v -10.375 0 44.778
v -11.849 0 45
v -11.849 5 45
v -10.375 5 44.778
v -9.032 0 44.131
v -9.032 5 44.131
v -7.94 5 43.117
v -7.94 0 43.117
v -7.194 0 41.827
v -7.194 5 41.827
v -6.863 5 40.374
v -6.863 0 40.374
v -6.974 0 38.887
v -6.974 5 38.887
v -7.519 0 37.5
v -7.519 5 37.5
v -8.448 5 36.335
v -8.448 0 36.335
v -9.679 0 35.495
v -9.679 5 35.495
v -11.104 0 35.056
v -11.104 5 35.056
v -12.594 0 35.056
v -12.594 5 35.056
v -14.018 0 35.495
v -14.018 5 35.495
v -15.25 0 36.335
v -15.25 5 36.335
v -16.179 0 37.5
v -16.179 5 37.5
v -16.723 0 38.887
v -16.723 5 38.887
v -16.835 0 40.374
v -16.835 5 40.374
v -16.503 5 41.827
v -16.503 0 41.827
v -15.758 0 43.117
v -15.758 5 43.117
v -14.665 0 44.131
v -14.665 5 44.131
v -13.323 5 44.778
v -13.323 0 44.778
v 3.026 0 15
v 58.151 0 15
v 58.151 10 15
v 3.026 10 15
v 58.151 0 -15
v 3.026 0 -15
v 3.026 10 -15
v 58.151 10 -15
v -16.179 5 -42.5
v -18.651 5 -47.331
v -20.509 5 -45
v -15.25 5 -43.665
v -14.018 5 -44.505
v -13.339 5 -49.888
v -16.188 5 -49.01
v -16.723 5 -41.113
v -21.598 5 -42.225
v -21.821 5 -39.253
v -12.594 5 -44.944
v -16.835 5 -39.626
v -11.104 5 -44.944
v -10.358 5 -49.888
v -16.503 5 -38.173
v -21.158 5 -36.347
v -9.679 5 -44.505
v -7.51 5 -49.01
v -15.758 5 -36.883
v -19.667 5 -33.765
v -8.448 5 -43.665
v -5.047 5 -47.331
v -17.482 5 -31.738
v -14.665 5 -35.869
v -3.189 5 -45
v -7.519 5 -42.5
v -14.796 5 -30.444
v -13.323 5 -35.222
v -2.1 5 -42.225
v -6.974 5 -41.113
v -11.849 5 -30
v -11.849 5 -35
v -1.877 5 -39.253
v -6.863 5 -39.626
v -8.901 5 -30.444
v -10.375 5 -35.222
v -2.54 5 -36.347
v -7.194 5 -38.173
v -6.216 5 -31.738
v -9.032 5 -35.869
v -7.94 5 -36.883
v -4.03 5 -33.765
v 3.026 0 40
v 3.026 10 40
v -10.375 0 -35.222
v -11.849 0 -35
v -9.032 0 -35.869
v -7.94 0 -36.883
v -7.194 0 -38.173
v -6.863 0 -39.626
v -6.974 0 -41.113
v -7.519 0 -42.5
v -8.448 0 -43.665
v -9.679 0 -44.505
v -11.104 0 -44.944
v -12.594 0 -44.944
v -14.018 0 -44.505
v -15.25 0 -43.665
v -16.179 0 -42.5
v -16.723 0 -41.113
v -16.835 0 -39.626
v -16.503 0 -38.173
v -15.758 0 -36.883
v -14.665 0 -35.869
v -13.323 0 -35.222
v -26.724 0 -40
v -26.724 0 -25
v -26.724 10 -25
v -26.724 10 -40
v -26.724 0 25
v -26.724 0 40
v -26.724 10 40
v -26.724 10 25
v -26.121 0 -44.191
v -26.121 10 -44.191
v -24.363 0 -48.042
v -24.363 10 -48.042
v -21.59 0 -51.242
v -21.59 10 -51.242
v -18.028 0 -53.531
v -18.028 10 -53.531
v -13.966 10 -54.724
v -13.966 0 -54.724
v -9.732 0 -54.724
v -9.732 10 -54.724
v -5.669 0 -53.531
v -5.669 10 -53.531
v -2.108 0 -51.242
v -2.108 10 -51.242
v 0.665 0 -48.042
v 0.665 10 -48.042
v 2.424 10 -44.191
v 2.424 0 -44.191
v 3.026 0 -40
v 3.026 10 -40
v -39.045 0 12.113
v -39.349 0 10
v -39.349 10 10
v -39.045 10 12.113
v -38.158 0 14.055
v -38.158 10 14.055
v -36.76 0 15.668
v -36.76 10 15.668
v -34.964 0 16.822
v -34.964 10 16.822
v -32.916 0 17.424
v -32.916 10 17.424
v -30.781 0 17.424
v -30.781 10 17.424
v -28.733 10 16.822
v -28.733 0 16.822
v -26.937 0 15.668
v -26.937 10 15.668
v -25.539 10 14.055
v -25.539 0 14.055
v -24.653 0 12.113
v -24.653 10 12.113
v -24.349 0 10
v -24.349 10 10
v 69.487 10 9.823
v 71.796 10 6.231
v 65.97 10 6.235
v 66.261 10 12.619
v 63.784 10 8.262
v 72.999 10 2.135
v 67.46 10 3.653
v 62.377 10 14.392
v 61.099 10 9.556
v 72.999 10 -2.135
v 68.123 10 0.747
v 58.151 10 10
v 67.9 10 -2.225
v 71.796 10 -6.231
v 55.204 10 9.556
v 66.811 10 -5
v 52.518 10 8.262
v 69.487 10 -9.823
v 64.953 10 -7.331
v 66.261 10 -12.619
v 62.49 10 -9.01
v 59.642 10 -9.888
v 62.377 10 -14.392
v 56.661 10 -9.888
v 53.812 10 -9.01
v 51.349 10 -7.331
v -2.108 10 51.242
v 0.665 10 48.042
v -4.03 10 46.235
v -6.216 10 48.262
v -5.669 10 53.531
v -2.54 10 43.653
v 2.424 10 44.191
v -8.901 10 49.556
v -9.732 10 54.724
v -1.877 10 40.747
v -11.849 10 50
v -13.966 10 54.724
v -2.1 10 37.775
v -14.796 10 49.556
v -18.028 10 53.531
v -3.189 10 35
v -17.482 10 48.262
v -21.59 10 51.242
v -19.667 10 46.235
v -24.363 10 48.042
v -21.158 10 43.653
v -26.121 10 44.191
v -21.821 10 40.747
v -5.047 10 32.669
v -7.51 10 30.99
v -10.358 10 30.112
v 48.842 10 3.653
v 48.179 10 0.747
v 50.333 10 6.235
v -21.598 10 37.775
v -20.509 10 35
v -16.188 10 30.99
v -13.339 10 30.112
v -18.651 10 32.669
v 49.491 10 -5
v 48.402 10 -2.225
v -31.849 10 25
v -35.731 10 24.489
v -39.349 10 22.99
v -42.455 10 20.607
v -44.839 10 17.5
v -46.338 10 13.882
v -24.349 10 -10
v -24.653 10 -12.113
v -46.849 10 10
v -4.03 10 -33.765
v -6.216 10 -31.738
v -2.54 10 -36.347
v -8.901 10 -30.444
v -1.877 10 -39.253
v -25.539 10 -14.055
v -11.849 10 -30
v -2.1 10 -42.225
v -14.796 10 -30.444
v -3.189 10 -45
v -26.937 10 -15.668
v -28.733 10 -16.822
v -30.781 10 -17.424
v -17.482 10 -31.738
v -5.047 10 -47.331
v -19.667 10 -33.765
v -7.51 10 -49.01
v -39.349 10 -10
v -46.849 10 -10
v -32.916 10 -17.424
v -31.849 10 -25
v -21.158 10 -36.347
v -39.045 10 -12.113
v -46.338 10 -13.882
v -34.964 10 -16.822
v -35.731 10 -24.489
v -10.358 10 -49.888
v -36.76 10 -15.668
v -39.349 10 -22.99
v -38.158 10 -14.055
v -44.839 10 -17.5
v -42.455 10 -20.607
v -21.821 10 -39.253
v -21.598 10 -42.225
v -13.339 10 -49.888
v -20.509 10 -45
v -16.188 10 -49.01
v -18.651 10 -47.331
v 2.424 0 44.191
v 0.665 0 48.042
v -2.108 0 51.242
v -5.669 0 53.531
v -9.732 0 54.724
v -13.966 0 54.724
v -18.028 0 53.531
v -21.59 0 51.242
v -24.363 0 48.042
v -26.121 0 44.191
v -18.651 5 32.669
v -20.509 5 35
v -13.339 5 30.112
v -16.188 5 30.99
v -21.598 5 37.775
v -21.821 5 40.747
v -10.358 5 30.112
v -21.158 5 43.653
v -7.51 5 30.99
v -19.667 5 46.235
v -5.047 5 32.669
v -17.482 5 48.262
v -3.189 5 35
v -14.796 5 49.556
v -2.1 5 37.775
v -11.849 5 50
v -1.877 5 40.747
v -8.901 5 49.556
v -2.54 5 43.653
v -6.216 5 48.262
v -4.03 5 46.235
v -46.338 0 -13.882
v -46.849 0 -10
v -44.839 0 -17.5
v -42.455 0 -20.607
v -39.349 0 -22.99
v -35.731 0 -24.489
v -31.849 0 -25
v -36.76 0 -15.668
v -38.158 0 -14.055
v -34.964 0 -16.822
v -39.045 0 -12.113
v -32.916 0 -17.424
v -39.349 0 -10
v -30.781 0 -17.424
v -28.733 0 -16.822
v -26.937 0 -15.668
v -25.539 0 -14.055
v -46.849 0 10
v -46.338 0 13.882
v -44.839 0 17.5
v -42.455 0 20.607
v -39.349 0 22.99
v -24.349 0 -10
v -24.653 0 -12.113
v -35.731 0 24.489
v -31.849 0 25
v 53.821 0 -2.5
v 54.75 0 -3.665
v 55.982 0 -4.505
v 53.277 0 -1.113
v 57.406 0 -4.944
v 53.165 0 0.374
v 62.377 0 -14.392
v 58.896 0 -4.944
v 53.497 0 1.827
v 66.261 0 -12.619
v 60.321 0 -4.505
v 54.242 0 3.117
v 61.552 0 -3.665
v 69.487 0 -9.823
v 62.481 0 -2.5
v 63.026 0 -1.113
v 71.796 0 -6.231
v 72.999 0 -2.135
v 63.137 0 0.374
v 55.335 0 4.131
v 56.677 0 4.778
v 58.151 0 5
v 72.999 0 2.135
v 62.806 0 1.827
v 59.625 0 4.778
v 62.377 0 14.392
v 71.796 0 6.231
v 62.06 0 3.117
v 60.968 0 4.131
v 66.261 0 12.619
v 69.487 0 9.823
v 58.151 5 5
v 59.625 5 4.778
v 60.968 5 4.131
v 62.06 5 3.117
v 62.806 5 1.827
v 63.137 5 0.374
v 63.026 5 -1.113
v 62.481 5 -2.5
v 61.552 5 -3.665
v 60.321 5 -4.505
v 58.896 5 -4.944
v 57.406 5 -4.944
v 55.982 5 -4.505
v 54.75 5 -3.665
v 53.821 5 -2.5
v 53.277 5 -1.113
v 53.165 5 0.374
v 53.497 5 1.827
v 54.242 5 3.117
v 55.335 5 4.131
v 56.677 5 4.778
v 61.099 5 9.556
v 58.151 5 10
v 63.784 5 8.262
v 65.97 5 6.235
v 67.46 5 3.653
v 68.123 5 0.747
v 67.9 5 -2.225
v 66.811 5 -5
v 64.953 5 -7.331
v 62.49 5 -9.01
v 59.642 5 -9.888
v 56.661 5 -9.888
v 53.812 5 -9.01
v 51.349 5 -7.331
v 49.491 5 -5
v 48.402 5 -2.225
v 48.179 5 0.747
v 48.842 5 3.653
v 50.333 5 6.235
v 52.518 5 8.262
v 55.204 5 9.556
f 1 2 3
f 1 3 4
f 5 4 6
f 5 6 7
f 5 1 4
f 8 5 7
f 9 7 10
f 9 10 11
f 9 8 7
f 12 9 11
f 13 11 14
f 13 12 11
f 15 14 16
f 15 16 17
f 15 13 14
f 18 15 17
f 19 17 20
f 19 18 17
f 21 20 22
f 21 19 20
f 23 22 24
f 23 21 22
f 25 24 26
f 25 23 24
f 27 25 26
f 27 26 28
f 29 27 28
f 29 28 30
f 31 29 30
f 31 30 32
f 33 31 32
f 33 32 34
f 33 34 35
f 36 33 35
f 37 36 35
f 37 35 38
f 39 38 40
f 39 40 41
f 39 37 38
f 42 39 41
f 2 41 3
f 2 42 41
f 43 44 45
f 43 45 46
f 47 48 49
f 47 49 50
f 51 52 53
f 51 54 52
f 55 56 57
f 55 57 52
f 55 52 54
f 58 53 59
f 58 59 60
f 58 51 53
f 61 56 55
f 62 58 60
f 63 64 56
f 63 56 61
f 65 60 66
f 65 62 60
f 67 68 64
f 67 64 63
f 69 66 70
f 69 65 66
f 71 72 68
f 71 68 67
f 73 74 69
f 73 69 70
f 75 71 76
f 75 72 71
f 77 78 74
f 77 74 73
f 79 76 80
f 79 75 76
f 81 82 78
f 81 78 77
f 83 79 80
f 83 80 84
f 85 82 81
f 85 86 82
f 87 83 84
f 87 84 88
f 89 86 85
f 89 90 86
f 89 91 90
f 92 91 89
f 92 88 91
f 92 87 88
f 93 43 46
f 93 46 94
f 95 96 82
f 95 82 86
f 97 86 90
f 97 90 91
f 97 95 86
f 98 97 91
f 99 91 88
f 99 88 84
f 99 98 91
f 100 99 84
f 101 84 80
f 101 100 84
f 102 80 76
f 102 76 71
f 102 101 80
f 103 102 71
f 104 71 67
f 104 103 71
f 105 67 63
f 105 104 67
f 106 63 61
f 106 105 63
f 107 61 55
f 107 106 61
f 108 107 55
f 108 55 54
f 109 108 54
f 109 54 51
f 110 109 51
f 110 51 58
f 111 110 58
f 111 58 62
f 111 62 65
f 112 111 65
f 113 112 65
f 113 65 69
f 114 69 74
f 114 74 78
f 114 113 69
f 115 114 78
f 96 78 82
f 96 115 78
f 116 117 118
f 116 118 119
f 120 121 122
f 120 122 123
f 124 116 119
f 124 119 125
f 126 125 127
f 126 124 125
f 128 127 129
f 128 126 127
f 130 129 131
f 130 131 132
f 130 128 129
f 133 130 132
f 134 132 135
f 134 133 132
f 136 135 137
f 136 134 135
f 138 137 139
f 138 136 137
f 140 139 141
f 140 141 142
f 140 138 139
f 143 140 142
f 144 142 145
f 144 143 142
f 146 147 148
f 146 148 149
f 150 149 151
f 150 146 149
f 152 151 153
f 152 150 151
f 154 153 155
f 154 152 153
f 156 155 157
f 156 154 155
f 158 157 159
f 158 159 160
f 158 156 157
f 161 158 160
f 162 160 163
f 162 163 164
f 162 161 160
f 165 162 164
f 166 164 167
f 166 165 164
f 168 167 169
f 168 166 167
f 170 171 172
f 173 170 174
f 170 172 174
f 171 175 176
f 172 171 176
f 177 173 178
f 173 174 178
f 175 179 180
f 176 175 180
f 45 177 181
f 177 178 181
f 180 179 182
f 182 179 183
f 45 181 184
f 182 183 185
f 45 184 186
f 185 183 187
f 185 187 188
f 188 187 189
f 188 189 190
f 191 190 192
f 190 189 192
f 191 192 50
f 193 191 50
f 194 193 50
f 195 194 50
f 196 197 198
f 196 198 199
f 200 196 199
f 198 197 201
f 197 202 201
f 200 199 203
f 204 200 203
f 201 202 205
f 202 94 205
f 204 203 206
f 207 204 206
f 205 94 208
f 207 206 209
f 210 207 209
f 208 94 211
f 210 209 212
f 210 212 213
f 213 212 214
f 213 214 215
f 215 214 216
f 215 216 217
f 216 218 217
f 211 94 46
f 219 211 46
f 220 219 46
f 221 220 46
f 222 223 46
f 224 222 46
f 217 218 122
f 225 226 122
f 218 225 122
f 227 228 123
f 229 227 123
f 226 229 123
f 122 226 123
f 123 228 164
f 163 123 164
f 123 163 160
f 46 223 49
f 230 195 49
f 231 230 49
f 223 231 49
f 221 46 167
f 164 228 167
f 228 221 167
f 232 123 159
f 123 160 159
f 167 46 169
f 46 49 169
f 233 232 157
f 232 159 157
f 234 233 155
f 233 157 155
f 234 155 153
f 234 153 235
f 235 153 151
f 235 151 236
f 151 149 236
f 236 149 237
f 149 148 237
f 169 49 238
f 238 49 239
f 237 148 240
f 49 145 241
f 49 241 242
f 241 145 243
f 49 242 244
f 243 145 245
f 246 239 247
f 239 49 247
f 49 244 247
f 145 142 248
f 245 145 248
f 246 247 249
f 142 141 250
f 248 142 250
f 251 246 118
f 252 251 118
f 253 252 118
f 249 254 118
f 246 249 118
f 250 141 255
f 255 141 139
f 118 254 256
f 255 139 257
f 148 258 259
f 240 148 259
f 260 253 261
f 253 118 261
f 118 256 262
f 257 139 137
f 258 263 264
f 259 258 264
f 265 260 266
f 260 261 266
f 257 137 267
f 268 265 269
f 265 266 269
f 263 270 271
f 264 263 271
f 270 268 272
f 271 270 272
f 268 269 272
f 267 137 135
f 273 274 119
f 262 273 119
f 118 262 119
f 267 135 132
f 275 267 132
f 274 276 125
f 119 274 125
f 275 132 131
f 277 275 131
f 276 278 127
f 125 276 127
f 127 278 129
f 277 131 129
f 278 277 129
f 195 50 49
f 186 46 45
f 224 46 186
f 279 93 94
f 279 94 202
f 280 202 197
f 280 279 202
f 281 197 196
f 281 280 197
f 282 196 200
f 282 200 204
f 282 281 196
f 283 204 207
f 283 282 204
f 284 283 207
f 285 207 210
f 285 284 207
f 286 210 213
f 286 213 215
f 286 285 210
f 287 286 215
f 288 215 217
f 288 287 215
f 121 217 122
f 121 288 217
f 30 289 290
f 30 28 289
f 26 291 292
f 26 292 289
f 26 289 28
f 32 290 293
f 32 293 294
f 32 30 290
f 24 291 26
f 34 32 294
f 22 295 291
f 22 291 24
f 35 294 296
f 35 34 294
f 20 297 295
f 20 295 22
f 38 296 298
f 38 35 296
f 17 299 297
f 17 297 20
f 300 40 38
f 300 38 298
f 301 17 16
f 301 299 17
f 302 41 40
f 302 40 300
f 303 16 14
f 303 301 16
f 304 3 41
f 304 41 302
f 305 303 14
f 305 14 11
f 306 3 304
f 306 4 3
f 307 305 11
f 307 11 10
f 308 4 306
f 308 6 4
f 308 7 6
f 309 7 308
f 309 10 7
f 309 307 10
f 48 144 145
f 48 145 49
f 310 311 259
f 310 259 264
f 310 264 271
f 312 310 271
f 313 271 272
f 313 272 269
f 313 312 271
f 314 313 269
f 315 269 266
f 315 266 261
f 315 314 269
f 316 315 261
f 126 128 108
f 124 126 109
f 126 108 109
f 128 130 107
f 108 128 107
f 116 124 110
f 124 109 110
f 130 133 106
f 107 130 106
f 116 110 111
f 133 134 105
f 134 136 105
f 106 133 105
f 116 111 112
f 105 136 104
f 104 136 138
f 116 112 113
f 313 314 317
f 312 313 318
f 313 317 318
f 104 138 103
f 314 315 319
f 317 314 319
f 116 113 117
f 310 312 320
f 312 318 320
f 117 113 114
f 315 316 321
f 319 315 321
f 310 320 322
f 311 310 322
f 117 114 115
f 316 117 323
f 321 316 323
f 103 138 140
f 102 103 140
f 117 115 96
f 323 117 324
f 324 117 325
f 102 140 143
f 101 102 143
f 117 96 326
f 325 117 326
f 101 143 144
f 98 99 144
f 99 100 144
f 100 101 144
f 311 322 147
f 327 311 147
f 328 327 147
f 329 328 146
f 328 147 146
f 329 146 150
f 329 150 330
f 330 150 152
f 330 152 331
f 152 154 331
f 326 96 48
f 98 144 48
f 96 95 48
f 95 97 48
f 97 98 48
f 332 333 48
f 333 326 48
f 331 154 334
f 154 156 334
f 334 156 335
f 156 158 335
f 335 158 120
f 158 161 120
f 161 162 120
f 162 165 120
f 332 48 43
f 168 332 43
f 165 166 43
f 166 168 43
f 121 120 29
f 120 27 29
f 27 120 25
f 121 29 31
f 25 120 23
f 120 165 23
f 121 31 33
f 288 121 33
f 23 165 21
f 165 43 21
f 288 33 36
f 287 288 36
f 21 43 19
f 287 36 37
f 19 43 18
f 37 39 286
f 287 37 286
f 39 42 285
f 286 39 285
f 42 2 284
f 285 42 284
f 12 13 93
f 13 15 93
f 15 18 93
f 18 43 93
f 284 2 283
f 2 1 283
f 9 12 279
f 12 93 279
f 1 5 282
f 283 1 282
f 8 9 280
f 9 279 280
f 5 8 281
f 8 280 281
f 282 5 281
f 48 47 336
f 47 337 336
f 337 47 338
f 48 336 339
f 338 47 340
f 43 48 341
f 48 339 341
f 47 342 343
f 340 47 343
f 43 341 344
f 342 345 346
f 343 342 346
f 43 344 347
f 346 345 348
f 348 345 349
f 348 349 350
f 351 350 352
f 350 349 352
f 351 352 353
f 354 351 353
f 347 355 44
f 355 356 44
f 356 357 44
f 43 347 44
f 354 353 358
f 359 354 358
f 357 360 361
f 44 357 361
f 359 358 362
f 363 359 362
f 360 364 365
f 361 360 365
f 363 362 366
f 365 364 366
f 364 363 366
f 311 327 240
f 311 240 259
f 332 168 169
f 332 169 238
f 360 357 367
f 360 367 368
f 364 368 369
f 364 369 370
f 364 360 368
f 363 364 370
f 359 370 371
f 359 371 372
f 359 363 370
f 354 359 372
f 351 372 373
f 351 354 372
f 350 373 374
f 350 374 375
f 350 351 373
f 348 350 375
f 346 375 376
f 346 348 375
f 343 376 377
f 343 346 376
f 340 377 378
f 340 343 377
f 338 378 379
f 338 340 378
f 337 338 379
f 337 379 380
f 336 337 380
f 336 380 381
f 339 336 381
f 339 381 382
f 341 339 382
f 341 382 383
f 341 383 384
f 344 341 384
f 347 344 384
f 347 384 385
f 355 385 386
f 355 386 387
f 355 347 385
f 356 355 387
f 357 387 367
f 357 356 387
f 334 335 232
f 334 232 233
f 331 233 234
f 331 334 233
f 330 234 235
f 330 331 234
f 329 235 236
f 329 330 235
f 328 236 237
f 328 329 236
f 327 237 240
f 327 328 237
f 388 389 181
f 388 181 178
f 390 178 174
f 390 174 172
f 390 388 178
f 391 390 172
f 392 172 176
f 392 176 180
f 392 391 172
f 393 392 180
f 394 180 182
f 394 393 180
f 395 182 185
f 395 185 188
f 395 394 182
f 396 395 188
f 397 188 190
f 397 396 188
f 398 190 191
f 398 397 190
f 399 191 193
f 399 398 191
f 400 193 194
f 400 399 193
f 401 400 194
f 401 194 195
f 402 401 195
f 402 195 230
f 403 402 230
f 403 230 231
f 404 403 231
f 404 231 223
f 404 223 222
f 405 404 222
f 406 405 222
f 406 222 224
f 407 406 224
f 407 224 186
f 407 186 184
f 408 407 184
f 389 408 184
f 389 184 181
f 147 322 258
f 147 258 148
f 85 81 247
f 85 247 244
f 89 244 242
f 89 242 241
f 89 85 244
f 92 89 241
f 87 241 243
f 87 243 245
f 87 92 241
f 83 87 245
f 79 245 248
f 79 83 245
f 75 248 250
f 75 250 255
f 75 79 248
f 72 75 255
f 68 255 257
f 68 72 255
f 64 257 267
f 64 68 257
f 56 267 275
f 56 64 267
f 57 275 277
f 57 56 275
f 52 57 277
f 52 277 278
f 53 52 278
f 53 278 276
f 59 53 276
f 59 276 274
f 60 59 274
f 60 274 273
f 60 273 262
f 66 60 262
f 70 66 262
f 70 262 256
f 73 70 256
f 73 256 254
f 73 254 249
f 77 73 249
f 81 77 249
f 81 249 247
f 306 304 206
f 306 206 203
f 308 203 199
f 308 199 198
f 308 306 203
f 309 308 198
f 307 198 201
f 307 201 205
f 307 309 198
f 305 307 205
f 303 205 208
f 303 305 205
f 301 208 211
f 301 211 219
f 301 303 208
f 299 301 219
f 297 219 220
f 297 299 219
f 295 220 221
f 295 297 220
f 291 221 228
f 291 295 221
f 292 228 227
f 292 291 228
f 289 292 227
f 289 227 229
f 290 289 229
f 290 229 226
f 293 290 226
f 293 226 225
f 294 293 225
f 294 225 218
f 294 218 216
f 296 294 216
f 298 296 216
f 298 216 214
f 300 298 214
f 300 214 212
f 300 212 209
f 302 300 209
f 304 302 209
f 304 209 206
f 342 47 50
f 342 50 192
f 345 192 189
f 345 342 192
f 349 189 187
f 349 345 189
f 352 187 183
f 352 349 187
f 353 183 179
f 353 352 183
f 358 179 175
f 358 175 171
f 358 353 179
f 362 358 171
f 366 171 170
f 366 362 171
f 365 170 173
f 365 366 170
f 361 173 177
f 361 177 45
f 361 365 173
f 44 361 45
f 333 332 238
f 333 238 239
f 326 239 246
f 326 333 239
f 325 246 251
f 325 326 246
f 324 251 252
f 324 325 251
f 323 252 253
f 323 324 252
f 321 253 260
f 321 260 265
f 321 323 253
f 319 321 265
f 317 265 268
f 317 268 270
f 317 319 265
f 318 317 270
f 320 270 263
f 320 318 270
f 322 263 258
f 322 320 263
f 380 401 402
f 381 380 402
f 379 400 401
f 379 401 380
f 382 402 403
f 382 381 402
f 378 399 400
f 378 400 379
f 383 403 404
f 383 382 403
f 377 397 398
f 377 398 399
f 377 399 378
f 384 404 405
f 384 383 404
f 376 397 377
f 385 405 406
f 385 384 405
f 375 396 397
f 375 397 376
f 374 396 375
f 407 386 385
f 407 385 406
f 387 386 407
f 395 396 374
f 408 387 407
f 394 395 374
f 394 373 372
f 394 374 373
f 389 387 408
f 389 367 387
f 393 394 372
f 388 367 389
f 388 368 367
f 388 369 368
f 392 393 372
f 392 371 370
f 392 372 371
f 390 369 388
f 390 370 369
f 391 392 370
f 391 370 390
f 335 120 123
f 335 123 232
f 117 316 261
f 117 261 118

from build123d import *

# Parameters (mm, degrees)
SKETCH3_R           = 10
BOSS_EXTRUDE1_DEPTH = 10
SKETCH3_5_R         = 10
SKETCH3_5_R_2       = 5
BOSS_EXTRUDE3_DEPTH = 5


with BuildPart() as part:
    # Sketch3 → Boss-Extrude1 (new body)
    with BuildSketch(Plane(origin=(0, 0, 0), x_dir=(1, 0, 0), z_dir=(0, 1, 0))):
        with BuildLine():
            ThreePointArc((58.151203912, -15), (73.151203912, 0), (58.151203912, 15))
            Line((58.151203912, 15), (3.026401107, 15))
            Line((3.026401107, 15), (3.026401107, 40))
            ThreePointArc((3.026401107, 40), (-11.848796088, 54.875197195), (-26.723993282, 40))
            Line((-26.723993282, 40), (-26.723993282, 25))
            Line((-26.723993282, 25), (-31.848796088, 25))
            ThreePointArc((-31.848796088, 25), (-42.455397805, 20.606601718), (-46.848796088, 10))
            Line((-46.848796088, 10), (-46.848796088, -10))
            ThreePointArc((-46.848796088, -10), (-42.455397805, -20.606601718), (-31.848796088, -25))
            Line((-31.848796088, -25), (-26.723993282, -25))
            Line((-26.723993282, -25), (-26.723993282, -40))
            ThreePointArc((-26.723993282, -40), (-11.848796088, -54.875197195), (3.026401107, -40))
            Line((3.026401107, -40), (3.026401107, -15))
            Line((3.026401107, -15), (58.151203912, -15))
        make_face()
        with Locations((-11.848796088, -40)):
            Circle(SKETCH3_R, mode=Mode.SUBTRACT)
        with BuildLine():
            Line((-39.348796088, -10), (-39.348796088, 10))
            ThreePointArc((-39.348796088, 10), (-31.848796088, 17.5), (-24.348796088, 10))
            Line((-24.348796088, 10), (-24.348796088, -10))
            ThreePointArc((-24.348796088, -10), (-31.848796088, -17.5), (-39.348796088, -10))
        make_face(mode=Mode.SUBTRACT)
        with Locations((-11.848796088, 40)):
            Circle(SKETCH3_R, mode=Mode.SUBTRACT)
        with Locations((58.151203912, 0)):
            Circle(SKETCH3_R, mode=Mode.SUBTRACT)
    extrude(amount=BOSS_EXTRUDE1_DEPTH)

    # Sketch3<5> → Boss-Extrude3 (add)
    # profile 1 of 3: a face of its own
    with BuildSketch(Plane(origin=(0, 0, 0), x_dir=(1, 0, 0), z_dir=(0, 1, 0))):
        with Locations((58.151203912, 0)):
            Circle(SKETCH3_5_R)
        with Locations((58.151203912, 0)):
            Circle(SKETCH3_5_R_2, mode=Mode.SUBTRACT)
    # profile 2 of 3: a face of its own
    with BuildSketch(Plane(origin=(0, 0, 0), x_dir=(1, 0, 0), z_dir=(0, 1, 0))):
        with Locations((-11.848796088, 40)):
            Circle(SKETCH3_5_R)
        with Locations((-11.848796088, 40)):
            Circle(SKETCH3_5_R_2, mode=Mode.SUBTRACT)
    # profile 3 of 3: a face of its own
    with BuildSketch(Plane(origin=(0, 0, 0), x_dir=(1, 0, 0), z_dir=(0, 1, 0))):
        with Locations((-11.848796088, -40)):
            Circle(SKETCH3_5_R)
        with Locations((-11.848796088, -40)):
            Circle(SKETCH3_5_R_2, mode=Mode.SUBTRACT)
    extrude(amount=BOSS_EXTRUDE3_DEPTH)


solid = part.part
